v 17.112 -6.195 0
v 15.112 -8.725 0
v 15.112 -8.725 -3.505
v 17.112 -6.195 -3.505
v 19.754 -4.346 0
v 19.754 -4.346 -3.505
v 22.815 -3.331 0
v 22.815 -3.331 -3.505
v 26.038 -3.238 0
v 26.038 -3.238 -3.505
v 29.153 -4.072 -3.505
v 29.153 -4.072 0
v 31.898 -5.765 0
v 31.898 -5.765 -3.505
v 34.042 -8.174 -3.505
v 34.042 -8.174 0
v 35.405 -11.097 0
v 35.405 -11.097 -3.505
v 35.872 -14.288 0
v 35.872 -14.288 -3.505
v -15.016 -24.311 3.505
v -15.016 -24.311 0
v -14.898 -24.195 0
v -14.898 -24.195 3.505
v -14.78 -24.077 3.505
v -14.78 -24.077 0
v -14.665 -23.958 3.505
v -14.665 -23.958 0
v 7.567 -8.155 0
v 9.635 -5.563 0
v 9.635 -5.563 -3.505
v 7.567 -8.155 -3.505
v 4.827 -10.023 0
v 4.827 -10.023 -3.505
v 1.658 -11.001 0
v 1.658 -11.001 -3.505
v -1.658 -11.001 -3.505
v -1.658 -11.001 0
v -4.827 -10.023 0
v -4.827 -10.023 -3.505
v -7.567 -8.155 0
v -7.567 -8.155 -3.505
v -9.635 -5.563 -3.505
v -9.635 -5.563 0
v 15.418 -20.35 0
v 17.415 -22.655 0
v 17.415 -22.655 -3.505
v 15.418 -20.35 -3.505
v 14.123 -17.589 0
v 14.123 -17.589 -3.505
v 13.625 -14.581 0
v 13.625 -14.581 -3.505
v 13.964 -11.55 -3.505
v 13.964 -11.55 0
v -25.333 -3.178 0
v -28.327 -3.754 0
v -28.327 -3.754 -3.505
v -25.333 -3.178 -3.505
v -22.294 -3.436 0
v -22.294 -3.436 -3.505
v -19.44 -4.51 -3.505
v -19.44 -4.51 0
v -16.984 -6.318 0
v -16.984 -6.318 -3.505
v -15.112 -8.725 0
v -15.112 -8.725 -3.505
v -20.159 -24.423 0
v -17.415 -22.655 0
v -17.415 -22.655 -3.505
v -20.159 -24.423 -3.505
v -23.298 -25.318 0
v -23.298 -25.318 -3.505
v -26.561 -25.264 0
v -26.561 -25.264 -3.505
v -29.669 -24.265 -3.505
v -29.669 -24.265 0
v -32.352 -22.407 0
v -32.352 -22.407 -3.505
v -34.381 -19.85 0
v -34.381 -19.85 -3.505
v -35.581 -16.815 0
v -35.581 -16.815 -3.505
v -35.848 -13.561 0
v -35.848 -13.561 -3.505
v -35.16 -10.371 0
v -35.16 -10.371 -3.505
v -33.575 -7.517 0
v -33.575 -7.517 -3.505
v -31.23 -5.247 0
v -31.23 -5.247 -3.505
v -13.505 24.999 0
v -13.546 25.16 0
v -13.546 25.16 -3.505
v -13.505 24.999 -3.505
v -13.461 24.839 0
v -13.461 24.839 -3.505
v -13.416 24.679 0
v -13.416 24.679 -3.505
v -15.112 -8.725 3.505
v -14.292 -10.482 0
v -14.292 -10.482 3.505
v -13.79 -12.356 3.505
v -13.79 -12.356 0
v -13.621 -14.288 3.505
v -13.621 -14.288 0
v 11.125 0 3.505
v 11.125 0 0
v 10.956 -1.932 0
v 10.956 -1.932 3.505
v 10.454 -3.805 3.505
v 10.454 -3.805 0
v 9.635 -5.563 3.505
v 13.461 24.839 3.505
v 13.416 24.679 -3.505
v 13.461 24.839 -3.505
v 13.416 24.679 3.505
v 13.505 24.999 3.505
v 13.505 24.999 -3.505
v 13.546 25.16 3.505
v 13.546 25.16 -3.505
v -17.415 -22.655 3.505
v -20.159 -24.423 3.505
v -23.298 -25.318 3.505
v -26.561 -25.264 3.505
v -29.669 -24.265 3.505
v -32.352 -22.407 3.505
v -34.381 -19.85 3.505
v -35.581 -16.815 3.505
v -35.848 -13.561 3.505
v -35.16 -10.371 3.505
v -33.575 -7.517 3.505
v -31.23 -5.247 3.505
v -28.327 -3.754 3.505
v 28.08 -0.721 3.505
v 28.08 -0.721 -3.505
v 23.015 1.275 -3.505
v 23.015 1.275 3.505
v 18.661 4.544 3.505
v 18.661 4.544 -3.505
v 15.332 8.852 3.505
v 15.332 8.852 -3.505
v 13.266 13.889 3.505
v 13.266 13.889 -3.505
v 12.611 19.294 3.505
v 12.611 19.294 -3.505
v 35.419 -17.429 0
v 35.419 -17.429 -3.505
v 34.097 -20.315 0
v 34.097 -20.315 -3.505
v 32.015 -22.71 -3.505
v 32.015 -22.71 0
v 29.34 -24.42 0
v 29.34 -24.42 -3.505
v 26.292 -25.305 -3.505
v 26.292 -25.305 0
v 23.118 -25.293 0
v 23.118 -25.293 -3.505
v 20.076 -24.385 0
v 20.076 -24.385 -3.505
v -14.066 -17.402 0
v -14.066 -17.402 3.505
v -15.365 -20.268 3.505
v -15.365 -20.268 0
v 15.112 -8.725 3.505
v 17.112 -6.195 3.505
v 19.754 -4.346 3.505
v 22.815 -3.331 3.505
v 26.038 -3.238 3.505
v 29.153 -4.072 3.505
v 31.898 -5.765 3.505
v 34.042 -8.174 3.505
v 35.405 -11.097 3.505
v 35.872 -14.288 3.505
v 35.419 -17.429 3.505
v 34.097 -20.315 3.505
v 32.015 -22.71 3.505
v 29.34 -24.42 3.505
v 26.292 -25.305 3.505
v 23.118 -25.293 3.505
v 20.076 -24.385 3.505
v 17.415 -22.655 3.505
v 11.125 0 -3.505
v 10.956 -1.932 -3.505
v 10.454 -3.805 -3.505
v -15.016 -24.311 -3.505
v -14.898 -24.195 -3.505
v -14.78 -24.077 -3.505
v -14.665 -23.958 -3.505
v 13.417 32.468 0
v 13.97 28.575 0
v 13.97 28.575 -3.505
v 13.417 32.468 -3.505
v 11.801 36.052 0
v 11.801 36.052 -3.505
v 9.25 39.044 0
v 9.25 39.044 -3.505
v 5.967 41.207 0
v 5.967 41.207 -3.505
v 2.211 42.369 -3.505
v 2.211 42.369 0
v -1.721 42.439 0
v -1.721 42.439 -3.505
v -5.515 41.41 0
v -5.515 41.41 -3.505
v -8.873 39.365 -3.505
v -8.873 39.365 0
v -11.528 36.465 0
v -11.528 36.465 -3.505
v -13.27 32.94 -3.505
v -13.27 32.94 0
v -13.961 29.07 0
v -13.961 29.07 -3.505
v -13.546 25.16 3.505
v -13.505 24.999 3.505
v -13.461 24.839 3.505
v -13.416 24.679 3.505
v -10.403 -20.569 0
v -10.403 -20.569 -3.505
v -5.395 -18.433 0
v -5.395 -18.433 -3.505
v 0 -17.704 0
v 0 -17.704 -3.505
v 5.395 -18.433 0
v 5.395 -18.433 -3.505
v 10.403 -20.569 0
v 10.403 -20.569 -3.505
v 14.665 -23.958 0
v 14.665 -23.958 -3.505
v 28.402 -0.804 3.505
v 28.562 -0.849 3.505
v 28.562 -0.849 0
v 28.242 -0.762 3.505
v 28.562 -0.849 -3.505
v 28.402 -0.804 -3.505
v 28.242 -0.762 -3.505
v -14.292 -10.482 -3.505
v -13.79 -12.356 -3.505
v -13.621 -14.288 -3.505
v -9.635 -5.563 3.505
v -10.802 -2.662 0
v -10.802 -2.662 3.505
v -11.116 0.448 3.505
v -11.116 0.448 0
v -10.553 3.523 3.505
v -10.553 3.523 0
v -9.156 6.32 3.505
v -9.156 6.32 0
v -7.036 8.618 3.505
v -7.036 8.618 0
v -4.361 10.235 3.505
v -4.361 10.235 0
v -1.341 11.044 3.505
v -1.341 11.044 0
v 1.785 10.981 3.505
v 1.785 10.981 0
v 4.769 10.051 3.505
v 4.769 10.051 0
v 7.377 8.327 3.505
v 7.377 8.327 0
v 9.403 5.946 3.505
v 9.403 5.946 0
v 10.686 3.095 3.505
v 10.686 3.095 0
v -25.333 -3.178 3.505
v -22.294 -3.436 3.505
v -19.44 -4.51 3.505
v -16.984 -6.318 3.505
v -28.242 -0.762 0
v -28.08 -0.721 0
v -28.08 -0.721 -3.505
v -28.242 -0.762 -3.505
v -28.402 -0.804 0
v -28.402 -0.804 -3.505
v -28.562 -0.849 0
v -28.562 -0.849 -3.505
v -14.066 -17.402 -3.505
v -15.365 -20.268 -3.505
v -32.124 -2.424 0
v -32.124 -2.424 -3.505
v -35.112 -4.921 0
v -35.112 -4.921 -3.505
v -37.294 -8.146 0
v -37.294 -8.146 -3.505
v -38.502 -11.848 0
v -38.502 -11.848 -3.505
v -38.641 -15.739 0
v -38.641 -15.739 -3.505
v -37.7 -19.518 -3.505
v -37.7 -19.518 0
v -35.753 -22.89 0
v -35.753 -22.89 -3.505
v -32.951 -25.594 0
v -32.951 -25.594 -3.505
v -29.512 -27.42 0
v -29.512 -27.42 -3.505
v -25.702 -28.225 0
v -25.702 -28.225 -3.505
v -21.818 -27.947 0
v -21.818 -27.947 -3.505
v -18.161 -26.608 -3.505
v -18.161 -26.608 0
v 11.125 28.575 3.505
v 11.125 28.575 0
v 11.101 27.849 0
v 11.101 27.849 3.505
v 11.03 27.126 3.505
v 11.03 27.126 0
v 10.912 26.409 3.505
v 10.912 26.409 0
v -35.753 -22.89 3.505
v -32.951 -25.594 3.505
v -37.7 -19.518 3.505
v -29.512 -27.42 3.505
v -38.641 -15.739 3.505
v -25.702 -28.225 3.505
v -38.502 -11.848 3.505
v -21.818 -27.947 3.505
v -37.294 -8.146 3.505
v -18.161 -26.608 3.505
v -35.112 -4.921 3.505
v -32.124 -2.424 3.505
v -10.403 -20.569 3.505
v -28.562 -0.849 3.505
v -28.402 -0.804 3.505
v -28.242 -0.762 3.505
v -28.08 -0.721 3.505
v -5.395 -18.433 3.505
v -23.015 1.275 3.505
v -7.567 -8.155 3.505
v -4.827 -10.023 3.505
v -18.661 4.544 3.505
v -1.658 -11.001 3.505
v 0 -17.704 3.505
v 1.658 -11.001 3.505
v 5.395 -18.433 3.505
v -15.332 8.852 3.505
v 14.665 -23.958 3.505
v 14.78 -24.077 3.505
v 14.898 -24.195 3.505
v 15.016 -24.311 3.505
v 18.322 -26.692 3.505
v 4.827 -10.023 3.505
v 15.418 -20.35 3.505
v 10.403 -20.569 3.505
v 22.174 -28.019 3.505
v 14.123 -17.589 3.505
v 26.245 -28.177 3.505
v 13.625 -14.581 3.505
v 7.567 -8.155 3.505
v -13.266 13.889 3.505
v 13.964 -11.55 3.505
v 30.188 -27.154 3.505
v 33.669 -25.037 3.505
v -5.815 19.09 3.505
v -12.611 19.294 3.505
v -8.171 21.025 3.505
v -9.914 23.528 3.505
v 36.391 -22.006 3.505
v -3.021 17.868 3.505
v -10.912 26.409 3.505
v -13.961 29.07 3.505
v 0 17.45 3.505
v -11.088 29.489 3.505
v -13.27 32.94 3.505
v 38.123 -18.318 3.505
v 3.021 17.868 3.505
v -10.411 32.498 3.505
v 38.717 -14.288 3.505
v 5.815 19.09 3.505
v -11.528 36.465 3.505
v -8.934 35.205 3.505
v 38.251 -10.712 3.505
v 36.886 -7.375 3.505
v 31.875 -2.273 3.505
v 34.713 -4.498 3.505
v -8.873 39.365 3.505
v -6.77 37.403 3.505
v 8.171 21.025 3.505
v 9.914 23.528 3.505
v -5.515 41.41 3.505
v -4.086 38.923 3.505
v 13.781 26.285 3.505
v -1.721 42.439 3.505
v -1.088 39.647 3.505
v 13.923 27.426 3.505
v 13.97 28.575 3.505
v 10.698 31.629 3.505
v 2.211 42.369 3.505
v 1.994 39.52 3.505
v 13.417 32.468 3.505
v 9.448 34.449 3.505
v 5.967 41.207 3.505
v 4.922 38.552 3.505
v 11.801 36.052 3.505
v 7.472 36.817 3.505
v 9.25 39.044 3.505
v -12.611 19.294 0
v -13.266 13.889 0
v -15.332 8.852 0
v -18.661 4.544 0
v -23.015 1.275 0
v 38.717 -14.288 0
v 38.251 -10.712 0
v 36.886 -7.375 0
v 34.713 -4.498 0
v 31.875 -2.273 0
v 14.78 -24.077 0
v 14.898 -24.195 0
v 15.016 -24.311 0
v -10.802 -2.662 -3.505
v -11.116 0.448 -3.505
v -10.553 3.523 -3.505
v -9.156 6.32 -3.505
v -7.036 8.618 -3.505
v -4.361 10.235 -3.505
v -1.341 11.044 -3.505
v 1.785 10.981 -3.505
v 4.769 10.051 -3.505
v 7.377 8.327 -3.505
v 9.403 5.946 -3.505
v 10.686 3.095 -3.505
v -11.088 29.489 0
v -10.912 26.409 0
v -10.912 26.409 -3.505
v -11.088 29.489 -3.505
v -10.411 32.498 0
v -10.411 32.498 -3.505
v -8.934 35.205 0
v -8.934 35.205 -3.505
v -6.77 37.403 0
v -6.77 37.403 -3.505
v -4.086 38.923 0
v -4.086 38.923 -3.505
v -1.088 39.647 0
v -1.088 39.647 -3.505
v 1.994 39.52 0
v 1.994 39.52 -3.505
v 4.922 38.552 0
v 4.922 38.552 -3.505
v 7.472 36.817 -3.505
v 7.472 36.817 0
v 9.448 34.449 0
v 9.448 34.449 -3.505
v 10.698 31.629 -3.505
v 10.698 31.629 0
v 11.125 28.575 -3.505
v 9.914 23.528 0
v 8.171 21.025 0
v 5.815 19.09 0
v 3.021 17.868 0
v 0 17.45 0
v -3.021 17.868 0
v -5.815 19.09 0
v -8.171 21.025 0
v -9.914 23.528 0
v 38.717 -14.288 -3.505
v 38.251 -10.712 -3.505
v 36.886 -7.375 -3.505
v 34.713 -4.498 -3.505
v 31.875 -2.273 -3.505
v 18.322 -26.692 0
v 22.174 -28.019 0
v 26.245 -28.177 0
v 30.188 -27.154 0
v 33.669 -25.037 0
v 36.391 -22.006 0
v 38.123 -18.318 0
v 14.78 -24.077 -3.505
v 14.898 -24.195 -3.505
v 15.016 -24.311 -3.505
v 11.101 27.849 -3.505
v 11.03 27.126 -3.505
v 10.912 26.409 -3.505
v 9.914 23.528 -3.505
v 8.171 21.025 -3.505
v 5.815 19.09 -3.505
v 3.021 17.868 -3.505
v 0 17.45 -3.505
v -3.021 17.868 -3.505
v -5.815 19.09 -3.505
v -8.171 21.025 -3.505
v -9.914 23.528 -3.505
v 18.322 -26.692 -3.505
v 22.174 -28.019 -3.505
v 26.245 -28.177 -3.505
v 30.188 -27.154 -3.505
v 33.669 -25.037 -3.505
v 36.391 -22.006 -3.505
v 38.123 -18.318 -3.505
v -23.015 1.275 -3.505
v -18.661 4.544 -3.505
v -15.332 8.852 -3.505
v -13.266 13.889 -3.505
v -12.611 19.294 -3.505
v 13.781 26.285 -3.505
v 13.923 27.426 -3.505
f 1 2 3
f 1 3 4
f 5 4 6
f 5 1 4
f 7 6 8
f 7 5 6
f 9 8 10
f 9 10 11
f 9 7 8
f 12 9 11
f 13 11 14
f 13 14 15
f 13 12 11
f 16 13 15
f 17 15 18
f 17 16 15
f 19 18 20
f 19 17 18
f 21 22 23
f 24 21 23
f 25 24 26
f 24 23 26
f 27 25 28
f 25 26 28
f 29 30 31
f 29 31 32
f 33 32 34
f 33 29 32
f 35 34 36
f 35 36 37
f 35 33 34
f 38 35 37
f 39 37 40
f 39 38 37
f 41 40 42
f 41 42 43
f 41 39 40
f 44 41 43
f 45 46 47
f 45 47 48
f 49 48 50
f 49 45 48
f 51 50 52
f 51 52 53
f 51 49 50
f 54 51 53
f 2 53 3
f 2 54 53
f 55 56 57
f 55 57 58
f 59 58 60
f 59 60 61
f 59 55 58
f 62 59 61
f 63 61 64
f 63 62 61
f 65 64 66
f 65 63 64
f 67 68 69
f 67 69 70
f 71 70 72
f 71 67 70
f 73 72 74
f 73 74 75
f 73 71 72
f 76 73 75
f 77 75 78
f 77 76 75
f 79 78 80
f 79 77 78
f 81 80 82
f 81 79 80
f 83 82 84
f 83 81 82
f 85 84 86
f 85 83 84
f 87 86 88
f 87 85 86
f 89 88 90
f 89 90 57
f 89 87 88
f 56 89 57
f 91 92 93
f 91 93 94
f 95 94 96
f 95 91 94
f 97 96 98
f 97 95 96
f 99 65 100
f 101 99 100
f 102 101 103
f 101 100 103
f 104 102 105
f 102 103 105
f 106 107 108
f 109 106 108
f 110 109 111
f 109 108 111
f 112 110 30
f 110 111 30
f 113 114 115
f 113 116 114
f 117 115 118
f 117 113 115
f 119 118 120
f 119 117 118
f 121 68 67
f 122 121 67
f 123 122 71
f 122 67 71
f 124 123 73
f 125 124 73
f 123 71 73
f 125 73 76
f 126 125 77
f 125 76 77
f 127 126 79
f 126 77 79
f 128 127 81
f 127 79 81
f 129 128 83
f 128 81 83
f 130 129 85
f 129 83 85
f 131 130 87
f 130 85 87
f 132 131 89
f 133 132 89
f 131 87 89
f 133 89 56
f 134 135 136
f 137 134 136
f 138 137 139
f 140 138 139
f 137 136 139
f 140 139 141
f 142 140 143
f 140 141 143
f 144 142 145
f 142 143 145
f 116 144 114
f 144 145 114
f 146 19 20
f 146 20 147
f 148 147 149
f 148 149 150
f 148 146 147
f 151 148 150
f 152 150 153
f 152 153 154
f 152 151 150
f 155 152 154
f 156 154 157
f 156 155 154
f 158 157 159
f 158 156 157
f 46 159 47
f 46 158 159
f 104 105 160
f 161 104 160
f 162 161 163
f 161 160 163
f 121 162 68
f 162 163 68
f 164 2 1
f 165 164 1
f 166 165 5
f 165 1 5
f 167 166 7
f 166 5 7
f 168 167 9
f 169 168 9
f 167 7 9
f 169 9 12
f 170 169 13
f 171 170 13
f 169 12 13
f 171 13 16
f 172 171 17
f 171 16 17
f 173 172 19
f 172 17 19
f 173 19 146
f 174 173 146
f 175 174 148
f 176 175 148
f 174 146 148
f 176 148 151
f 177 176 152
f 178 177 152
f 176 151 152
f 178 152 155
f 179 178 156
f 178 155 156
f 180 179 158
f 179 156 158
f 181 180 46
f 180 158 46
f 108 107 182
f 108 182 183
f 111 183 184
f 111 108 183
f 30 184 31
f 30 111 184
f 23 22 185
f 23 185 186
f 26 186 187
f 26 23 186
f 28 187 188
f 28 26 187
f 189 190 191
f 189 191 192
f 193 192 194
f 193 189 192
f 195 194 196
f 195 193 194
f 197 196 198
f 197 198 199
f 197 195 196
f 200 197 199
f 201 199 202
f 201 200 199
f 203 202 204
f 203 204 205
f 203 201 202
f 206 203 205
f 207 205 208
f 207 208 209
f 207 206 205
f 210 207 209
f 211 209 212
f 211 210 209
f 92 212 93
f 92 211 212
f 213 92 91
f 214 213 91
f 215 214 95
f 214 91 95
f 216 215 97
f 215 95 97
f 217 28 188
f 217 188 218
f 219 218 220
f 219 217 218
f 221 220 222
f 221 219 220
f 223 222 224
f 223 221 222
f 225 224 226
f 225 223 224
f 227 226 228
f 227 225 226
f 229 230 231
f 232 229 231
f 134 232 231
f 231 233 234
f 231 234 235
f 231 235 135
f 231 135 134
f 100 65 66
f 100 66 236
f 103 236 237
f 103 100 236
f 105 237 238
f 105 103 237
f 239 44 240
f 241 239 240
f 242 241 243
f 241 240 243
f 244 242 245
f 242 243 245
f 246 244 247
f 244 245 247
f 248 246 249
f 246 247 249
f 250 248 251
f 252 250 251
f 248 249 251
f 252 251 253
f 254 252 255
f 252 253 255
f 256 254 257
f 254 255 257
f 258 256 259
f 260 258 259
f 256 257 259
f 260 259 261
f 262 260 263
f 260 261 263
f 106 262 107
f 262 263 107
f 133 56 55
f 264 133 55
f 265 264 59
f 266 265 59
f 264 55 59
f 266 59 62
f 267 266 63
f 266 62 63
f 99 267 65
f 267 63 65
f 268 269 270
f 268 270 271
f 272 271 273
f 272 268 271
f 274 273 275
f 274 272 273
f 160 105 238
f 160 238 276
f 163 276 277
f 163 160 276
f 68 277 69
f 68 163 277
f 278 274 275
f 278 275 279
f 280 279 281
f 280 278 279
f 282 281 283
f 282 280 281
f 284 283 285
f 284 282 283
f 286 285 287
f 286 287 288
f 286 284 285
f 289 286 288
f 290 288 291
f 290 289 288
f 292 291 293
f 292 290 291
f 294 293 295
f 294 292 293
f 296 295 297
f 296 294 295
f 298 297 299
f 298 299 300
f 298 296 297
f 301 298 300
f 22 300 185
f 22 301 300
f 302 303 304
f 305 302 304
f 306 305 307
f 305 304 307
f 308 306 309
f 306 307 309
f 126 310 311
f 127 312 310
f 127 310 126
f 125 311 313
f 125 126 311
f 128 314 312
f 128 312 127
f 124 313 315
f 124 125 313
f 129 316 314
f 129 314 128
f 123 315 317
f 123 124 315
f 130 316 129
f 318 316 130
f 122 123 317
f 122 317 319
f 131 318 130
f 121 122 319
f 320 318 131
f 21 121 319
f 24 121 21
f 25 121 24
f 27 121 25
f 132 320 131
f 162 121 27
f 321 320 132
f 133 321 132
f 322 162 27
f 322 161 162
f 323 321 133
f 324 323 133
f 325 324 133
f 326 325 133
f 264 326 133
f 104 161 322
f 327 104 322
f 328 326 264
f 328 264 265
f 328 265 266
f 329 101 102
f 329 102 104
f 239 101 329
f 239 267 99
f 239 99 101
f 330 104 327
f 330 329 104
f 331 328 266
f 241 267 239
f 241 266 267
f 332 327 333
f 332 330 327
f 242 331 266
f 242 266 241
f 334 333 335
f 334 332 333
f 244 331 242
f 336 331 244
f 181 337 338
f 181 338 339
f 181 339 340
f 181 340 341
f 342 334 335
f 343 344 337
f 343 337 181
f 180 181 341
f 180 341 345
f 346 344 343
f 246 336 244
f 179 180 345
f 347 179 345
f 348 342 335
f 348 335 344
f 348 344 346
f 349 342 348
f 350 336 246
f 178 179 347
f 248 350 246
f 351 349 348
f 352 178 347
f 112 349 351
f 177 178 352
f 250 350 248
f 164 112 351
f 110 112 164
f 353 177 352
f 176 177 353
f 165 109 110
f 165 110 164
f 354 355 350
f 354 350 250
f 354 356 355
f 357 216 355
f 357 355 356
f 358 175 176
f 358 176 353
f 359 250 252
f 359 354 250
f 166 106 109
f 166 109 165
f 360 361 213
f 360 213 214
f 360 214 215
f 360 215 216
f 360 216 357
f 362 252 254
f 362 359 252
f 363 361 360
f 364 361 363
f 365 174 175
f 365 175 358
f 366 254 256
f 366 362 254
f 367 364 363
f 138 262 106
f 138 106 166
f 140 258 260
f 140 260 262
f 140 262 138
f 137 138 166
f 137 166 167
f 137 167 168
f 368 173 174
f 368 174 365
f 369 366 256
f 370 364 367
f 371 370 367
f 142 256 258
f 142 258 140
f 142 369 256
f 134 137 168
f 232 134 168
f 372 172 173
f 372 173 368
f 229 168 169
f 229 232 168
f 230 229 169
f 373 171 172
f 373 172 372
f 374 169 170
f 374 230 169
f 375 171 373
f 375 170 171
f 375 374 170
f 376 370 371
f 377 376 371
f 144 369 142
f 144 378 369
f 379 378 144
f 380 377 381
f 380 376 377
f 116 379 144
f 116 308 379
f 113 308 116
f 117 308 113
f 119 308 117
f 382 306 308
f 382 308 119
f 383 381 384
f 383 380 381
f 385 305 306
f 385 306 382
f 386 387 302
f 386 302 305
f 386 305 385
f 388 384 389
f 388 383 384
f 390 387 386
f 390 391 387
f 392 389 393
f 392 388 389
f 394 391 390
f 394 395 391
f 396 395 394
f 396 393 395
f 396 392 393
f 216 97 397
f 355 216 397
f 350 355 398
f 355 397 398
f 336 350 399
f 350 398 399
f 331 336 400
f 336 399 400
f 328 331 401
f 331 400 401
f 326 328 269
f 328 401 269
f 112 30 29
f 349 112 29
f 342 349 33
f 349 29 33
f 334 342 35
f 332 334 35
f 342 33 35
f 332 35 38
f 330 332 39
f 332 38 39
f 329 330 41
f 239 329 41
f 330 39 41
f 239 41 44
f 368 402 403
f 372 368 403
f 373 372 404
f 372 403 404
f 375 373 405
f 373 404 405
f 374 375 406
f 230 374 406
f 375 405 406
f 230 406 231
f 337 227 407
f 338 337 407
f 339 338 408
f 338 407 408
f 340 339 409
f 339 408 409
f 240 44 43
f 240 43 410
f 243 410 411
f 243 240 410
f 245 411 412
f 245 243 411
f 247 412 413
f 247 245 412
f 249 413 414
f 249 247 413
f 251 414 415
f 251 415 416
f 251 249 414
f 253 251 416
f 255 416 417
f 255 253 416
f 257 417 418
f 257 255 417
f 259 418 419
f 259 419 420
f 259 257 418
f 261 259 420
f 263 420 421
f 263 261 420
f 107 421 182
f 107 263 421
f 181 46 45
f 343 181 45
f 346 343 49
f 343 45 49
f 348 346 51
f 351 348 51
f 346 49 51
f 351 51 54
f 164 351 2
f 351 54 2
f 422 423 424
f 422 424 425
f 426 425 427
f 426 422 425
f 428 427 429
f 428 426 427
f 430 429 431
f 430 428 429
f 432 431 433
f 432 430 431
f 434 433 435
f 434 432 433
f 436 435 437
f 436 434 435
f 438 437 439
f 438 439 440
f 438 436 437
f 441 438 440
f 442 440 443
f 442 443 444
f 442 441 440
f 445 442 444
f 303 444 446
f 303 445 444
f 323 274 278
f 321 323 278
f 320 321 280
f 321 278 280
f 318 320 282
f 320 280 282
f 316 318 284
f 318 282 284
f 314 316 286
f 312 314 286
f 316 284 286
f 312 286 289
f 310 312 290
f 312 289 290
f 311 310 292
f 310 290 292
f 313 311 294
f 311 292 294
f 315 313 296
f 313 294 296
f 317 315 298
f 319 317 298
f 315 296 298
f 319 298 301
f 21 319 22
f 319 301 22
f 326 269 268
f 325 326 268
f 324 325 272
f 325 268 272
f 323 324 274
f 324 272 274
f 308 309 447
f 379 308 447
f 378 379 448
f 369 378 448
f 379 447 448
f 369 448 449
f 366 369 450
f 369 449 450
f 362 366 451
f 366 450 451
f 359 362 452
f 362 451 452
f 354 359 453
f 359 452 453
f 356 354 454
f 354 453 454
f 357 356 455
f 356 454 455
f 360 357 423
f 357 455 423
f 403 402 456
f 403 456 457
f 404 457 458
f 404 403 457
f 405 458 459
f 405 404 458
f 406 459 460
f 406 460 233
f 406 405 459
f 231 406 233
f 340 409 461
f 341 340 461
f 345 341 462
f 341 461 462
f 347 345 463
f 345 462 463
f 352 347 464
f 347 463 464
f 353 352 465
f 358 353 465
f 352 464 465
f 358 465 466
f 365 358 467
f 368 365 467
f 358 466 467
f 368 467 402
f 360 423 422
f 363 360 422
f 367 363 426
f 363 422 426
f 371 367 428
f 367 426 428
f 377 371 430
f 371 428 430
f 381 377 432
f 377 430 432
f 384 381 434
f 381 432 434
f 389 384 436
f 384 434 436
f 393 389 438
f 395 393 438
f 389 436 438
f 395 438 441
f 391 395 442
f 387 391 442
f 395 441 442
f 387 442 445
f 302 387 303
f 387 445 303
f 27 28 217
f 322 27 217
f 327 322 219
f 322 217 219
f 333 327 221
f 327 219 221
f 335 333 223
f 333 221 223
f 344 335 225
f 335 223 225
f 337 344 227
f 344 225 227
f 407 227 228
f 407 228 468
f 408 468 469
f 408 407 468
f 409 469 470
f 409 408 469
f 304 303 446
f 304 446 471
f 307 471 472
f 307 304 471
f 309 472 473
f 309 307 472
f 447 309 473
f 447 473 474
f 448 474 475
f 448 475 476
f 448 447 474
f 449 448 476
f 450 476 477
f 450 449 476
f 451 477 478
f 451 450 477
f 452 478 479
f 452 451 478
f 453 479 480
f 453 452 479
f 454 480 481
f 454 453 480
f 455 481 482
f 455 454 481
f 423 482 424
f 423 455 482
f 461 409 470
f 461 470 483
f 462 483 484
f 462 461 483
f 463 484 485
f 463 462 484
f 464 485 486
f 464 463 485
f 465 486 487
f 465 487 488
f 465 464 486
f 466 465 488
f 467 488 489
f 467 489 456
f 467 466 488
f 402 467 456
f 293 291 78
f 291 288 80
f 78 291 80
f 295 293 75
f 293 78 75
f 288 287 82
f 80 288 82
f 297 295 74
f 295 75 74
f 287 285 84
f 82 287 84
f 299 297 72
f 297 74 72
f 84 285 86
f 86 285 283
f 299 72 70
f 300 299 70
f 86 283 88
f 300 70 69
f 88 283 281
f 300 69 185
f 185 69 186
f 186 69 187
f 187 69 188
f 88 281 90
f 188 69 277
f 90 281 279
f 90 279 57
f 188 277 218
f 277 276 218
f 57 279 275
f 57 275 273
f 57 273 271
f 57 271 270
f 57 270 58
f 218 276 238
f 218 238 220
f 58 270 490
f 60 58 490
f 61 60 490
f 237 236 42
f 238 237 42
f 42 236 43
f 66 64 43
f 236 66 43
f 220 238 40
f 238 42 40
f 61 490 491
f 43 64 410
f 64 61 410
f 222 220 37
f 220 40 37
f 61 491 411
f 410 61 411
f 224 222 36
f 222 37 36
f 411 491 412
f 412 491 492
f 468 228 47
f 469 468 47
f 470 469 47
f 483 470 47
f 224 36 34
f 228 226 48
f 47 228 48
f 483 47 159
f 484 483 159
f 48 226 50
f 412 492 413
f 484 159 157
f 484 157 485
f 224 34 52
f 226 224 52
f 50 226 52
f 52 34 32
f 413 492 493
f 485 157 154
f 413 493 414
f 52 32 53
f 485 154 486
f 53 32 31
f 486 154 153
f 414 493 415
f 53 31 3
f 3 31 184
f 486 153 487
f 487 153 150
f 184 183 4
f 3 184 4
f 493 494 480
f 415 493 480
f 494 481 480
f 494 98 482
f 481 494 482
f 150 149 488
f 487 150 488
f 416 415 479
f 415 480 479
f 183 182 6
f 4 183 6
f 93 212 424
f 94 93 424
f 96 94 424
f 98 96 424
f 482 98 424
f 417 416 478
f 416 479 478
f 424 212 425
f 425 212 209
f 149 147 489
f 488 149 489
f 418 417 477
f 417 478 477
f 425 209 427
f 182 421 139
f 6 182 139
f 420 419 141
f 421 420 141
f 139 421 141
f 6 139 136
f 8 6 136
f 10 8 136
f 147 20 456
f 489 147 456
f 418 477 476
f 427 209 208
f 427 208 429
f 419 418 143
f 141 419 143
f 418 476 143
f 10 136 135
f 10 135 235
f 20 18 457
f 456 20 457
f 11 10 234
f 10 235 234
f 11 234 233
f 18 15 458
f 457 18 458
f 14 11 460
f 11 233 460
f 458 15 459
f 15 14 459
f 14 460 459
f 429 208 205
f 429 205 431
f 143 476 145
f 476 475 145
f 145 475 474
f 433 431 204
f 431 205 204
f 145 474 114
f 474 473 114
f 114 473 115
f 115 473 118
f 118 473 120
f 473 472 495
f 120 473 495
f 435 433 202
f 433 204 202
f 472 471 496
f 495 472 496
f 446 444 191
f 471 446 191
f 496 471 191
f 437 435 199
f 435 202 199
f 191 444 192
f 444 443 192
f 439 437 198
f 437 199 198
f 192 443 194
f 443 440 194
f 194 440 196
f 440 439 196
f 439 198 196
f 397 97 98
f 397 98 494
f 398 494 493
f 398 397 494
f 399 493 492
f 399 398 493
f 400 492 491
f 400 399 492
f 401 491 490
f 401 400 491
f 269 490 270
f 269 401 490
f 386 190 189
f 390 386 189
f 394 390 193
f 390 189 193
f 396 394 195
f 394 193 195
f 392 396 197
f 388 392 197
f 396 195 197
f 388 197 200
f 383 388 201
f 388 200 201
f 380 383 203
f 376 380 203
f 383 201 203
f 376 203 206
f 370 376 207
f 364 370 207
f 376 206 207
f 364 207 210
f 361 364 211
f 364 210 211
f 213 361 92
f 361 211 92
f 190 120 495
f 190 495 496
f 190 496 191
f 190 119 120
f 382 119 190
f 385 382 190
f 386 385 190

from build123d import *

# Parameters (mm, degrees)
F1_DEPTH = 3.5052


with BuildPart() as f1:
    # F0 (on Top) → F1 (new body, symmetric)
    with BuildSketch(Plane.XY):
        with BuildLine():
            ThreePointArc((10.9123688672, 26.4092944), (12.2452222147, 25.8183105162), (13.5461962881, 25.1601111111))
            ThreePointArc((13.5461962881, 25.1601111111), (13.8636442205, 26.8544567929), (13.97, 28.575))
            ThreePointArc((13.97, 28.575), (-1.7205432071, 42.4386442205), (-13.5461962881, 25.1601111111))
            ThreePointArc((-13.5461962881, 25.1601111111), (-12.2452222147, 25.8183105162), (-10.9123688672, 26.4092944))
            ThreePointArc((-10.9123688672, 26.4092944), (-1.0880691427, 39.6468643679), (11.1252, 28.575))
            ThreePointArc((11.1252, 28.575), (11.0718643679, 27.4869308573), (10.9123688672, 26.4092944))
        make_face()
        with BuildLine():
            ThreePointArc((13.4157103354, 24.6788973069), (13.4831003065, 24.9189220298), (13.5461962881, 25.1601111111))
            ThreePointArc((13.5461962881, 25.1601111111), (12.2452222147, 25.8183105162), (10.9123688672, 26.4092944))
            ThreePointArc((10.9123688672, 26.4092944), (0, 17.4498), (-10.9123688672, 26.4092944))
            ThreePointArc((-10.9123688672, 26.4092944), (-12.2452222147, 25.8183105162), (-13.5461962881, 25.1601111111))
            ThreePointArc((-13.5461962881, 25.1601111111), (-13.4831003065, 24.9189220298), (-13.4157103354, 24.6788973069))
            ThreePointArc((-13.4157103354, 24.6788973069), (0, 14.605), (13.4157103354, 24.6788973069))
        make_face()
        with BuildLine():
            ThreePointArc((28.0804071729, -0.7211026931), (15.3318346185, 8.8518388441), (13.4157103354, 24.6788973069))
            ThreePointArc((13.4157103354, 24.6788973069), (0, 14.605), (-13.4157103354, 24.6788973069))
            ThreePointArc((-13.4157103354, 24.6788973069), (-15.3318346185, 8.8518388441), (-28.0804071729, -0.7211026931))
            ThreePointArc((-28.0804071729, -0.7211026931), (-19.2663983542, -1.4373070879), (-12.6483010223, -7.3025))
            Line((-12.6483010223, -7.3025), (-9.6347058222, -5.5626))
            ThreePointArc((-9.6347058222, -5.5626), (-2.8794136406, 10.7461180026), (11.1252, 0))
            ThreePointArc((11.1252, 0), (10.7461180026, -2.8794136406), (9.6347058222, -5.5626))
            Line((9.6347058222, -5.5626), (12.6483010223, -7.3025))
            ThreePointArc((12.6483010223, -7.3025), (19.2663983542, -1.4373070879), (28.0804071729, -0.7211026931))
        make_face()
        with BuildLine():
            ThreePointArc((28.32730428, -3.7542585455), (28.4819238972, -2.3044817452), (28.5623935283, -0.8487054454))
            ThreePointArc((28.5623935283, -0.8487054454), (28.321969666, -0.7827536277), (28.0804071729, -0.7211026931))
            ThreePointArc((28.0804071729, -0.7211026931), (19.2663983542, -1.4373070879), (12.6483010223, -7.3025))
            Line((12.6483010223, -7.3025), (15.111970091, -8.7249))
            ThreePointArc((15.111970091, -8.7249), (20.8300724642, -3.8745132784), (28.32730428, -3.7542585455))
        make_face()
        with BuildLine():
            ThreePointArc((38.7166759131, -14.2875), (35.8926723936, -5.8656437641), (28.5623935283, -0.8487054454))
            ThreePointArc((28.5623935283, -0.8487054454), (28.4819238972, -2.3044817452), (28.32730428, -3.7542585455))
            ThreePointArc((28.32730428, -3.7542585455), (33.7911571516, -7.8092722974), (35.8718759131, -14.2875))
            ThreePointArc((35.8718759131, -14.2875), (29.3403125785, -24.4200503812), (17.4149354128, -22.6550358545))
            ThreePointArc((17.4149354128, -22.6550358545), (16.2367016825, -23.513828771), (15.0161972402, -24.3114056657))
            ThreePointArc((15.0161972402, -24.3114056657), (30.1884638978, -27.1540396875), (38.7166759131, -14.2875))
        make_face()
        with BuildLine():
            ThreePointArc((17.4149354128, -22.6550358545), (13.7704631585, -16.1021152775), (15.111970091, -8.7249))
            Line((15.111970091, -8.7249), (12.6483010223, -7.3025))
            ThreePointArc((12.6483010223, -7.3025), (10.8779436283, -15.9665368702), (14.6646968374, -23.9577946137))
            ThreePointArc((14.6646968374, -23.9577946137), (14.8388693595, -24.1361684021), (15.0161972402, -24.3114056657))
            ThreePointArc((15.0161972402, -24.3114056657), (16.2367016825, -23.513828771), (17.4149354128, -22.6550358545))
        make_face()
        with BuildLine():
            ThreePointArc((14.6646968374, -23.9577946137), (10.8779436283, -15.9665368702), (12.6483010223, -7.3025))
            Line((12.6483010223, -7.3025), (9.6347058222, -5.5626))
            ThreePointArc((9.6347058222, -5.5626), (0, -11.1252), (-9.6347058222, -5.5626))
            Line((-9.6347058222, -5.5626), (-12.6483010223, -7.3025))
            ThreePointArc((-12.6483010223, -7.3025), (-11.2526921199, -10.6717979399), (-10.7766759131, -14.2875))
            ThreePointArc((-10.7766759131, -14.2875), (-11.7850759408, -19.498817123), (-14.6646968374, -23.9577946137))
            ThreePointArc((-14.6646968374, -23.9577946137), (0, -17.7036776883), (14.6646968374, -23.9577946137))
        make_face()
        with BuildLine():
            ThreePointArc((-17.4149354128, -22.6550358545), (-16.2367016825, -23.513828771), (-15.0161972402, -24.3114056657))
            ThreePointArc((-15.0161972402, -24.3114056657), (-14.8388693595, -24.1361684021), (-14.6646968374, -23.9577946137))
            ThreePointArc((-14.6646968374, -23.9577946137), (-11.7850759408, -19.498817123), (-10.7766759131, -14.2875))
            ThreePointArc((-10.7766759131, -14.2875), (-11.2526921199, -10.6717979399), (-12.6483010223, -7.3025))
            Line((-12.6483010223, -7.3025), (-15.111970091, -8.7249))
            ThreePointArc((-15.111970091, -8.7249), (-14.0005579105, -11.4080863594), (-13.6214759131, -14.2875))
            ThreePointArc((-13.6214759131, -14.2875), (-14.614125532, -18.8811366653), (-17.4149354128, -22.6550358545))
        make_face()
        with BuildLine():
            ThreePointArc((-12.6483010223, -7.3025), (-19.2663983542, -1.4373070879), (-28.0804071729, -0.7211026931))
            ThreePointArc((-28.0804071729, -0.7211026931), (-28.321969666, -0.7827536277), (-28.5623935283, -0.8487054454))
            ThreePointArc((-28.5623935283, -0.8487054454), (-28.4819238972, -2.3044817452), (-28.32730428, -3.7542585455))
            ThreePointArc((-28.32730428, -3.7542585455), (-20.8300724642, -3.8745132784), (-15.111970091, -8.7249))
            Line((-15.111970091, -8.7249), (-12.6483010223, -7.3025))
        make_face()
        with BuildLine():
            ThreePointArc((-28.32730428, -3.7542585455), (-28.4819238972, -2.3044817452), (-28.5623935283, -0.8487054454))
            ThreePointArc((-28.5623935283, -0.8487054454), (-36.845050804, -21.2725), (-15.0161972402, -24.3114056657))
            ThreePointArc((-15.0161972402, -24.3114056657), (-16.2367016825, -23.513828771), (-17.4149354128, -22.6550358545))
            ThreePointArc((-17.4149354128, -22.6550358545), (-34.3813817353, -19.8501), (-28.32730428, -3.7542585455))
        make_face()
    extrude(amount=F1_DEPTH, both=True)


solid = f1.part
